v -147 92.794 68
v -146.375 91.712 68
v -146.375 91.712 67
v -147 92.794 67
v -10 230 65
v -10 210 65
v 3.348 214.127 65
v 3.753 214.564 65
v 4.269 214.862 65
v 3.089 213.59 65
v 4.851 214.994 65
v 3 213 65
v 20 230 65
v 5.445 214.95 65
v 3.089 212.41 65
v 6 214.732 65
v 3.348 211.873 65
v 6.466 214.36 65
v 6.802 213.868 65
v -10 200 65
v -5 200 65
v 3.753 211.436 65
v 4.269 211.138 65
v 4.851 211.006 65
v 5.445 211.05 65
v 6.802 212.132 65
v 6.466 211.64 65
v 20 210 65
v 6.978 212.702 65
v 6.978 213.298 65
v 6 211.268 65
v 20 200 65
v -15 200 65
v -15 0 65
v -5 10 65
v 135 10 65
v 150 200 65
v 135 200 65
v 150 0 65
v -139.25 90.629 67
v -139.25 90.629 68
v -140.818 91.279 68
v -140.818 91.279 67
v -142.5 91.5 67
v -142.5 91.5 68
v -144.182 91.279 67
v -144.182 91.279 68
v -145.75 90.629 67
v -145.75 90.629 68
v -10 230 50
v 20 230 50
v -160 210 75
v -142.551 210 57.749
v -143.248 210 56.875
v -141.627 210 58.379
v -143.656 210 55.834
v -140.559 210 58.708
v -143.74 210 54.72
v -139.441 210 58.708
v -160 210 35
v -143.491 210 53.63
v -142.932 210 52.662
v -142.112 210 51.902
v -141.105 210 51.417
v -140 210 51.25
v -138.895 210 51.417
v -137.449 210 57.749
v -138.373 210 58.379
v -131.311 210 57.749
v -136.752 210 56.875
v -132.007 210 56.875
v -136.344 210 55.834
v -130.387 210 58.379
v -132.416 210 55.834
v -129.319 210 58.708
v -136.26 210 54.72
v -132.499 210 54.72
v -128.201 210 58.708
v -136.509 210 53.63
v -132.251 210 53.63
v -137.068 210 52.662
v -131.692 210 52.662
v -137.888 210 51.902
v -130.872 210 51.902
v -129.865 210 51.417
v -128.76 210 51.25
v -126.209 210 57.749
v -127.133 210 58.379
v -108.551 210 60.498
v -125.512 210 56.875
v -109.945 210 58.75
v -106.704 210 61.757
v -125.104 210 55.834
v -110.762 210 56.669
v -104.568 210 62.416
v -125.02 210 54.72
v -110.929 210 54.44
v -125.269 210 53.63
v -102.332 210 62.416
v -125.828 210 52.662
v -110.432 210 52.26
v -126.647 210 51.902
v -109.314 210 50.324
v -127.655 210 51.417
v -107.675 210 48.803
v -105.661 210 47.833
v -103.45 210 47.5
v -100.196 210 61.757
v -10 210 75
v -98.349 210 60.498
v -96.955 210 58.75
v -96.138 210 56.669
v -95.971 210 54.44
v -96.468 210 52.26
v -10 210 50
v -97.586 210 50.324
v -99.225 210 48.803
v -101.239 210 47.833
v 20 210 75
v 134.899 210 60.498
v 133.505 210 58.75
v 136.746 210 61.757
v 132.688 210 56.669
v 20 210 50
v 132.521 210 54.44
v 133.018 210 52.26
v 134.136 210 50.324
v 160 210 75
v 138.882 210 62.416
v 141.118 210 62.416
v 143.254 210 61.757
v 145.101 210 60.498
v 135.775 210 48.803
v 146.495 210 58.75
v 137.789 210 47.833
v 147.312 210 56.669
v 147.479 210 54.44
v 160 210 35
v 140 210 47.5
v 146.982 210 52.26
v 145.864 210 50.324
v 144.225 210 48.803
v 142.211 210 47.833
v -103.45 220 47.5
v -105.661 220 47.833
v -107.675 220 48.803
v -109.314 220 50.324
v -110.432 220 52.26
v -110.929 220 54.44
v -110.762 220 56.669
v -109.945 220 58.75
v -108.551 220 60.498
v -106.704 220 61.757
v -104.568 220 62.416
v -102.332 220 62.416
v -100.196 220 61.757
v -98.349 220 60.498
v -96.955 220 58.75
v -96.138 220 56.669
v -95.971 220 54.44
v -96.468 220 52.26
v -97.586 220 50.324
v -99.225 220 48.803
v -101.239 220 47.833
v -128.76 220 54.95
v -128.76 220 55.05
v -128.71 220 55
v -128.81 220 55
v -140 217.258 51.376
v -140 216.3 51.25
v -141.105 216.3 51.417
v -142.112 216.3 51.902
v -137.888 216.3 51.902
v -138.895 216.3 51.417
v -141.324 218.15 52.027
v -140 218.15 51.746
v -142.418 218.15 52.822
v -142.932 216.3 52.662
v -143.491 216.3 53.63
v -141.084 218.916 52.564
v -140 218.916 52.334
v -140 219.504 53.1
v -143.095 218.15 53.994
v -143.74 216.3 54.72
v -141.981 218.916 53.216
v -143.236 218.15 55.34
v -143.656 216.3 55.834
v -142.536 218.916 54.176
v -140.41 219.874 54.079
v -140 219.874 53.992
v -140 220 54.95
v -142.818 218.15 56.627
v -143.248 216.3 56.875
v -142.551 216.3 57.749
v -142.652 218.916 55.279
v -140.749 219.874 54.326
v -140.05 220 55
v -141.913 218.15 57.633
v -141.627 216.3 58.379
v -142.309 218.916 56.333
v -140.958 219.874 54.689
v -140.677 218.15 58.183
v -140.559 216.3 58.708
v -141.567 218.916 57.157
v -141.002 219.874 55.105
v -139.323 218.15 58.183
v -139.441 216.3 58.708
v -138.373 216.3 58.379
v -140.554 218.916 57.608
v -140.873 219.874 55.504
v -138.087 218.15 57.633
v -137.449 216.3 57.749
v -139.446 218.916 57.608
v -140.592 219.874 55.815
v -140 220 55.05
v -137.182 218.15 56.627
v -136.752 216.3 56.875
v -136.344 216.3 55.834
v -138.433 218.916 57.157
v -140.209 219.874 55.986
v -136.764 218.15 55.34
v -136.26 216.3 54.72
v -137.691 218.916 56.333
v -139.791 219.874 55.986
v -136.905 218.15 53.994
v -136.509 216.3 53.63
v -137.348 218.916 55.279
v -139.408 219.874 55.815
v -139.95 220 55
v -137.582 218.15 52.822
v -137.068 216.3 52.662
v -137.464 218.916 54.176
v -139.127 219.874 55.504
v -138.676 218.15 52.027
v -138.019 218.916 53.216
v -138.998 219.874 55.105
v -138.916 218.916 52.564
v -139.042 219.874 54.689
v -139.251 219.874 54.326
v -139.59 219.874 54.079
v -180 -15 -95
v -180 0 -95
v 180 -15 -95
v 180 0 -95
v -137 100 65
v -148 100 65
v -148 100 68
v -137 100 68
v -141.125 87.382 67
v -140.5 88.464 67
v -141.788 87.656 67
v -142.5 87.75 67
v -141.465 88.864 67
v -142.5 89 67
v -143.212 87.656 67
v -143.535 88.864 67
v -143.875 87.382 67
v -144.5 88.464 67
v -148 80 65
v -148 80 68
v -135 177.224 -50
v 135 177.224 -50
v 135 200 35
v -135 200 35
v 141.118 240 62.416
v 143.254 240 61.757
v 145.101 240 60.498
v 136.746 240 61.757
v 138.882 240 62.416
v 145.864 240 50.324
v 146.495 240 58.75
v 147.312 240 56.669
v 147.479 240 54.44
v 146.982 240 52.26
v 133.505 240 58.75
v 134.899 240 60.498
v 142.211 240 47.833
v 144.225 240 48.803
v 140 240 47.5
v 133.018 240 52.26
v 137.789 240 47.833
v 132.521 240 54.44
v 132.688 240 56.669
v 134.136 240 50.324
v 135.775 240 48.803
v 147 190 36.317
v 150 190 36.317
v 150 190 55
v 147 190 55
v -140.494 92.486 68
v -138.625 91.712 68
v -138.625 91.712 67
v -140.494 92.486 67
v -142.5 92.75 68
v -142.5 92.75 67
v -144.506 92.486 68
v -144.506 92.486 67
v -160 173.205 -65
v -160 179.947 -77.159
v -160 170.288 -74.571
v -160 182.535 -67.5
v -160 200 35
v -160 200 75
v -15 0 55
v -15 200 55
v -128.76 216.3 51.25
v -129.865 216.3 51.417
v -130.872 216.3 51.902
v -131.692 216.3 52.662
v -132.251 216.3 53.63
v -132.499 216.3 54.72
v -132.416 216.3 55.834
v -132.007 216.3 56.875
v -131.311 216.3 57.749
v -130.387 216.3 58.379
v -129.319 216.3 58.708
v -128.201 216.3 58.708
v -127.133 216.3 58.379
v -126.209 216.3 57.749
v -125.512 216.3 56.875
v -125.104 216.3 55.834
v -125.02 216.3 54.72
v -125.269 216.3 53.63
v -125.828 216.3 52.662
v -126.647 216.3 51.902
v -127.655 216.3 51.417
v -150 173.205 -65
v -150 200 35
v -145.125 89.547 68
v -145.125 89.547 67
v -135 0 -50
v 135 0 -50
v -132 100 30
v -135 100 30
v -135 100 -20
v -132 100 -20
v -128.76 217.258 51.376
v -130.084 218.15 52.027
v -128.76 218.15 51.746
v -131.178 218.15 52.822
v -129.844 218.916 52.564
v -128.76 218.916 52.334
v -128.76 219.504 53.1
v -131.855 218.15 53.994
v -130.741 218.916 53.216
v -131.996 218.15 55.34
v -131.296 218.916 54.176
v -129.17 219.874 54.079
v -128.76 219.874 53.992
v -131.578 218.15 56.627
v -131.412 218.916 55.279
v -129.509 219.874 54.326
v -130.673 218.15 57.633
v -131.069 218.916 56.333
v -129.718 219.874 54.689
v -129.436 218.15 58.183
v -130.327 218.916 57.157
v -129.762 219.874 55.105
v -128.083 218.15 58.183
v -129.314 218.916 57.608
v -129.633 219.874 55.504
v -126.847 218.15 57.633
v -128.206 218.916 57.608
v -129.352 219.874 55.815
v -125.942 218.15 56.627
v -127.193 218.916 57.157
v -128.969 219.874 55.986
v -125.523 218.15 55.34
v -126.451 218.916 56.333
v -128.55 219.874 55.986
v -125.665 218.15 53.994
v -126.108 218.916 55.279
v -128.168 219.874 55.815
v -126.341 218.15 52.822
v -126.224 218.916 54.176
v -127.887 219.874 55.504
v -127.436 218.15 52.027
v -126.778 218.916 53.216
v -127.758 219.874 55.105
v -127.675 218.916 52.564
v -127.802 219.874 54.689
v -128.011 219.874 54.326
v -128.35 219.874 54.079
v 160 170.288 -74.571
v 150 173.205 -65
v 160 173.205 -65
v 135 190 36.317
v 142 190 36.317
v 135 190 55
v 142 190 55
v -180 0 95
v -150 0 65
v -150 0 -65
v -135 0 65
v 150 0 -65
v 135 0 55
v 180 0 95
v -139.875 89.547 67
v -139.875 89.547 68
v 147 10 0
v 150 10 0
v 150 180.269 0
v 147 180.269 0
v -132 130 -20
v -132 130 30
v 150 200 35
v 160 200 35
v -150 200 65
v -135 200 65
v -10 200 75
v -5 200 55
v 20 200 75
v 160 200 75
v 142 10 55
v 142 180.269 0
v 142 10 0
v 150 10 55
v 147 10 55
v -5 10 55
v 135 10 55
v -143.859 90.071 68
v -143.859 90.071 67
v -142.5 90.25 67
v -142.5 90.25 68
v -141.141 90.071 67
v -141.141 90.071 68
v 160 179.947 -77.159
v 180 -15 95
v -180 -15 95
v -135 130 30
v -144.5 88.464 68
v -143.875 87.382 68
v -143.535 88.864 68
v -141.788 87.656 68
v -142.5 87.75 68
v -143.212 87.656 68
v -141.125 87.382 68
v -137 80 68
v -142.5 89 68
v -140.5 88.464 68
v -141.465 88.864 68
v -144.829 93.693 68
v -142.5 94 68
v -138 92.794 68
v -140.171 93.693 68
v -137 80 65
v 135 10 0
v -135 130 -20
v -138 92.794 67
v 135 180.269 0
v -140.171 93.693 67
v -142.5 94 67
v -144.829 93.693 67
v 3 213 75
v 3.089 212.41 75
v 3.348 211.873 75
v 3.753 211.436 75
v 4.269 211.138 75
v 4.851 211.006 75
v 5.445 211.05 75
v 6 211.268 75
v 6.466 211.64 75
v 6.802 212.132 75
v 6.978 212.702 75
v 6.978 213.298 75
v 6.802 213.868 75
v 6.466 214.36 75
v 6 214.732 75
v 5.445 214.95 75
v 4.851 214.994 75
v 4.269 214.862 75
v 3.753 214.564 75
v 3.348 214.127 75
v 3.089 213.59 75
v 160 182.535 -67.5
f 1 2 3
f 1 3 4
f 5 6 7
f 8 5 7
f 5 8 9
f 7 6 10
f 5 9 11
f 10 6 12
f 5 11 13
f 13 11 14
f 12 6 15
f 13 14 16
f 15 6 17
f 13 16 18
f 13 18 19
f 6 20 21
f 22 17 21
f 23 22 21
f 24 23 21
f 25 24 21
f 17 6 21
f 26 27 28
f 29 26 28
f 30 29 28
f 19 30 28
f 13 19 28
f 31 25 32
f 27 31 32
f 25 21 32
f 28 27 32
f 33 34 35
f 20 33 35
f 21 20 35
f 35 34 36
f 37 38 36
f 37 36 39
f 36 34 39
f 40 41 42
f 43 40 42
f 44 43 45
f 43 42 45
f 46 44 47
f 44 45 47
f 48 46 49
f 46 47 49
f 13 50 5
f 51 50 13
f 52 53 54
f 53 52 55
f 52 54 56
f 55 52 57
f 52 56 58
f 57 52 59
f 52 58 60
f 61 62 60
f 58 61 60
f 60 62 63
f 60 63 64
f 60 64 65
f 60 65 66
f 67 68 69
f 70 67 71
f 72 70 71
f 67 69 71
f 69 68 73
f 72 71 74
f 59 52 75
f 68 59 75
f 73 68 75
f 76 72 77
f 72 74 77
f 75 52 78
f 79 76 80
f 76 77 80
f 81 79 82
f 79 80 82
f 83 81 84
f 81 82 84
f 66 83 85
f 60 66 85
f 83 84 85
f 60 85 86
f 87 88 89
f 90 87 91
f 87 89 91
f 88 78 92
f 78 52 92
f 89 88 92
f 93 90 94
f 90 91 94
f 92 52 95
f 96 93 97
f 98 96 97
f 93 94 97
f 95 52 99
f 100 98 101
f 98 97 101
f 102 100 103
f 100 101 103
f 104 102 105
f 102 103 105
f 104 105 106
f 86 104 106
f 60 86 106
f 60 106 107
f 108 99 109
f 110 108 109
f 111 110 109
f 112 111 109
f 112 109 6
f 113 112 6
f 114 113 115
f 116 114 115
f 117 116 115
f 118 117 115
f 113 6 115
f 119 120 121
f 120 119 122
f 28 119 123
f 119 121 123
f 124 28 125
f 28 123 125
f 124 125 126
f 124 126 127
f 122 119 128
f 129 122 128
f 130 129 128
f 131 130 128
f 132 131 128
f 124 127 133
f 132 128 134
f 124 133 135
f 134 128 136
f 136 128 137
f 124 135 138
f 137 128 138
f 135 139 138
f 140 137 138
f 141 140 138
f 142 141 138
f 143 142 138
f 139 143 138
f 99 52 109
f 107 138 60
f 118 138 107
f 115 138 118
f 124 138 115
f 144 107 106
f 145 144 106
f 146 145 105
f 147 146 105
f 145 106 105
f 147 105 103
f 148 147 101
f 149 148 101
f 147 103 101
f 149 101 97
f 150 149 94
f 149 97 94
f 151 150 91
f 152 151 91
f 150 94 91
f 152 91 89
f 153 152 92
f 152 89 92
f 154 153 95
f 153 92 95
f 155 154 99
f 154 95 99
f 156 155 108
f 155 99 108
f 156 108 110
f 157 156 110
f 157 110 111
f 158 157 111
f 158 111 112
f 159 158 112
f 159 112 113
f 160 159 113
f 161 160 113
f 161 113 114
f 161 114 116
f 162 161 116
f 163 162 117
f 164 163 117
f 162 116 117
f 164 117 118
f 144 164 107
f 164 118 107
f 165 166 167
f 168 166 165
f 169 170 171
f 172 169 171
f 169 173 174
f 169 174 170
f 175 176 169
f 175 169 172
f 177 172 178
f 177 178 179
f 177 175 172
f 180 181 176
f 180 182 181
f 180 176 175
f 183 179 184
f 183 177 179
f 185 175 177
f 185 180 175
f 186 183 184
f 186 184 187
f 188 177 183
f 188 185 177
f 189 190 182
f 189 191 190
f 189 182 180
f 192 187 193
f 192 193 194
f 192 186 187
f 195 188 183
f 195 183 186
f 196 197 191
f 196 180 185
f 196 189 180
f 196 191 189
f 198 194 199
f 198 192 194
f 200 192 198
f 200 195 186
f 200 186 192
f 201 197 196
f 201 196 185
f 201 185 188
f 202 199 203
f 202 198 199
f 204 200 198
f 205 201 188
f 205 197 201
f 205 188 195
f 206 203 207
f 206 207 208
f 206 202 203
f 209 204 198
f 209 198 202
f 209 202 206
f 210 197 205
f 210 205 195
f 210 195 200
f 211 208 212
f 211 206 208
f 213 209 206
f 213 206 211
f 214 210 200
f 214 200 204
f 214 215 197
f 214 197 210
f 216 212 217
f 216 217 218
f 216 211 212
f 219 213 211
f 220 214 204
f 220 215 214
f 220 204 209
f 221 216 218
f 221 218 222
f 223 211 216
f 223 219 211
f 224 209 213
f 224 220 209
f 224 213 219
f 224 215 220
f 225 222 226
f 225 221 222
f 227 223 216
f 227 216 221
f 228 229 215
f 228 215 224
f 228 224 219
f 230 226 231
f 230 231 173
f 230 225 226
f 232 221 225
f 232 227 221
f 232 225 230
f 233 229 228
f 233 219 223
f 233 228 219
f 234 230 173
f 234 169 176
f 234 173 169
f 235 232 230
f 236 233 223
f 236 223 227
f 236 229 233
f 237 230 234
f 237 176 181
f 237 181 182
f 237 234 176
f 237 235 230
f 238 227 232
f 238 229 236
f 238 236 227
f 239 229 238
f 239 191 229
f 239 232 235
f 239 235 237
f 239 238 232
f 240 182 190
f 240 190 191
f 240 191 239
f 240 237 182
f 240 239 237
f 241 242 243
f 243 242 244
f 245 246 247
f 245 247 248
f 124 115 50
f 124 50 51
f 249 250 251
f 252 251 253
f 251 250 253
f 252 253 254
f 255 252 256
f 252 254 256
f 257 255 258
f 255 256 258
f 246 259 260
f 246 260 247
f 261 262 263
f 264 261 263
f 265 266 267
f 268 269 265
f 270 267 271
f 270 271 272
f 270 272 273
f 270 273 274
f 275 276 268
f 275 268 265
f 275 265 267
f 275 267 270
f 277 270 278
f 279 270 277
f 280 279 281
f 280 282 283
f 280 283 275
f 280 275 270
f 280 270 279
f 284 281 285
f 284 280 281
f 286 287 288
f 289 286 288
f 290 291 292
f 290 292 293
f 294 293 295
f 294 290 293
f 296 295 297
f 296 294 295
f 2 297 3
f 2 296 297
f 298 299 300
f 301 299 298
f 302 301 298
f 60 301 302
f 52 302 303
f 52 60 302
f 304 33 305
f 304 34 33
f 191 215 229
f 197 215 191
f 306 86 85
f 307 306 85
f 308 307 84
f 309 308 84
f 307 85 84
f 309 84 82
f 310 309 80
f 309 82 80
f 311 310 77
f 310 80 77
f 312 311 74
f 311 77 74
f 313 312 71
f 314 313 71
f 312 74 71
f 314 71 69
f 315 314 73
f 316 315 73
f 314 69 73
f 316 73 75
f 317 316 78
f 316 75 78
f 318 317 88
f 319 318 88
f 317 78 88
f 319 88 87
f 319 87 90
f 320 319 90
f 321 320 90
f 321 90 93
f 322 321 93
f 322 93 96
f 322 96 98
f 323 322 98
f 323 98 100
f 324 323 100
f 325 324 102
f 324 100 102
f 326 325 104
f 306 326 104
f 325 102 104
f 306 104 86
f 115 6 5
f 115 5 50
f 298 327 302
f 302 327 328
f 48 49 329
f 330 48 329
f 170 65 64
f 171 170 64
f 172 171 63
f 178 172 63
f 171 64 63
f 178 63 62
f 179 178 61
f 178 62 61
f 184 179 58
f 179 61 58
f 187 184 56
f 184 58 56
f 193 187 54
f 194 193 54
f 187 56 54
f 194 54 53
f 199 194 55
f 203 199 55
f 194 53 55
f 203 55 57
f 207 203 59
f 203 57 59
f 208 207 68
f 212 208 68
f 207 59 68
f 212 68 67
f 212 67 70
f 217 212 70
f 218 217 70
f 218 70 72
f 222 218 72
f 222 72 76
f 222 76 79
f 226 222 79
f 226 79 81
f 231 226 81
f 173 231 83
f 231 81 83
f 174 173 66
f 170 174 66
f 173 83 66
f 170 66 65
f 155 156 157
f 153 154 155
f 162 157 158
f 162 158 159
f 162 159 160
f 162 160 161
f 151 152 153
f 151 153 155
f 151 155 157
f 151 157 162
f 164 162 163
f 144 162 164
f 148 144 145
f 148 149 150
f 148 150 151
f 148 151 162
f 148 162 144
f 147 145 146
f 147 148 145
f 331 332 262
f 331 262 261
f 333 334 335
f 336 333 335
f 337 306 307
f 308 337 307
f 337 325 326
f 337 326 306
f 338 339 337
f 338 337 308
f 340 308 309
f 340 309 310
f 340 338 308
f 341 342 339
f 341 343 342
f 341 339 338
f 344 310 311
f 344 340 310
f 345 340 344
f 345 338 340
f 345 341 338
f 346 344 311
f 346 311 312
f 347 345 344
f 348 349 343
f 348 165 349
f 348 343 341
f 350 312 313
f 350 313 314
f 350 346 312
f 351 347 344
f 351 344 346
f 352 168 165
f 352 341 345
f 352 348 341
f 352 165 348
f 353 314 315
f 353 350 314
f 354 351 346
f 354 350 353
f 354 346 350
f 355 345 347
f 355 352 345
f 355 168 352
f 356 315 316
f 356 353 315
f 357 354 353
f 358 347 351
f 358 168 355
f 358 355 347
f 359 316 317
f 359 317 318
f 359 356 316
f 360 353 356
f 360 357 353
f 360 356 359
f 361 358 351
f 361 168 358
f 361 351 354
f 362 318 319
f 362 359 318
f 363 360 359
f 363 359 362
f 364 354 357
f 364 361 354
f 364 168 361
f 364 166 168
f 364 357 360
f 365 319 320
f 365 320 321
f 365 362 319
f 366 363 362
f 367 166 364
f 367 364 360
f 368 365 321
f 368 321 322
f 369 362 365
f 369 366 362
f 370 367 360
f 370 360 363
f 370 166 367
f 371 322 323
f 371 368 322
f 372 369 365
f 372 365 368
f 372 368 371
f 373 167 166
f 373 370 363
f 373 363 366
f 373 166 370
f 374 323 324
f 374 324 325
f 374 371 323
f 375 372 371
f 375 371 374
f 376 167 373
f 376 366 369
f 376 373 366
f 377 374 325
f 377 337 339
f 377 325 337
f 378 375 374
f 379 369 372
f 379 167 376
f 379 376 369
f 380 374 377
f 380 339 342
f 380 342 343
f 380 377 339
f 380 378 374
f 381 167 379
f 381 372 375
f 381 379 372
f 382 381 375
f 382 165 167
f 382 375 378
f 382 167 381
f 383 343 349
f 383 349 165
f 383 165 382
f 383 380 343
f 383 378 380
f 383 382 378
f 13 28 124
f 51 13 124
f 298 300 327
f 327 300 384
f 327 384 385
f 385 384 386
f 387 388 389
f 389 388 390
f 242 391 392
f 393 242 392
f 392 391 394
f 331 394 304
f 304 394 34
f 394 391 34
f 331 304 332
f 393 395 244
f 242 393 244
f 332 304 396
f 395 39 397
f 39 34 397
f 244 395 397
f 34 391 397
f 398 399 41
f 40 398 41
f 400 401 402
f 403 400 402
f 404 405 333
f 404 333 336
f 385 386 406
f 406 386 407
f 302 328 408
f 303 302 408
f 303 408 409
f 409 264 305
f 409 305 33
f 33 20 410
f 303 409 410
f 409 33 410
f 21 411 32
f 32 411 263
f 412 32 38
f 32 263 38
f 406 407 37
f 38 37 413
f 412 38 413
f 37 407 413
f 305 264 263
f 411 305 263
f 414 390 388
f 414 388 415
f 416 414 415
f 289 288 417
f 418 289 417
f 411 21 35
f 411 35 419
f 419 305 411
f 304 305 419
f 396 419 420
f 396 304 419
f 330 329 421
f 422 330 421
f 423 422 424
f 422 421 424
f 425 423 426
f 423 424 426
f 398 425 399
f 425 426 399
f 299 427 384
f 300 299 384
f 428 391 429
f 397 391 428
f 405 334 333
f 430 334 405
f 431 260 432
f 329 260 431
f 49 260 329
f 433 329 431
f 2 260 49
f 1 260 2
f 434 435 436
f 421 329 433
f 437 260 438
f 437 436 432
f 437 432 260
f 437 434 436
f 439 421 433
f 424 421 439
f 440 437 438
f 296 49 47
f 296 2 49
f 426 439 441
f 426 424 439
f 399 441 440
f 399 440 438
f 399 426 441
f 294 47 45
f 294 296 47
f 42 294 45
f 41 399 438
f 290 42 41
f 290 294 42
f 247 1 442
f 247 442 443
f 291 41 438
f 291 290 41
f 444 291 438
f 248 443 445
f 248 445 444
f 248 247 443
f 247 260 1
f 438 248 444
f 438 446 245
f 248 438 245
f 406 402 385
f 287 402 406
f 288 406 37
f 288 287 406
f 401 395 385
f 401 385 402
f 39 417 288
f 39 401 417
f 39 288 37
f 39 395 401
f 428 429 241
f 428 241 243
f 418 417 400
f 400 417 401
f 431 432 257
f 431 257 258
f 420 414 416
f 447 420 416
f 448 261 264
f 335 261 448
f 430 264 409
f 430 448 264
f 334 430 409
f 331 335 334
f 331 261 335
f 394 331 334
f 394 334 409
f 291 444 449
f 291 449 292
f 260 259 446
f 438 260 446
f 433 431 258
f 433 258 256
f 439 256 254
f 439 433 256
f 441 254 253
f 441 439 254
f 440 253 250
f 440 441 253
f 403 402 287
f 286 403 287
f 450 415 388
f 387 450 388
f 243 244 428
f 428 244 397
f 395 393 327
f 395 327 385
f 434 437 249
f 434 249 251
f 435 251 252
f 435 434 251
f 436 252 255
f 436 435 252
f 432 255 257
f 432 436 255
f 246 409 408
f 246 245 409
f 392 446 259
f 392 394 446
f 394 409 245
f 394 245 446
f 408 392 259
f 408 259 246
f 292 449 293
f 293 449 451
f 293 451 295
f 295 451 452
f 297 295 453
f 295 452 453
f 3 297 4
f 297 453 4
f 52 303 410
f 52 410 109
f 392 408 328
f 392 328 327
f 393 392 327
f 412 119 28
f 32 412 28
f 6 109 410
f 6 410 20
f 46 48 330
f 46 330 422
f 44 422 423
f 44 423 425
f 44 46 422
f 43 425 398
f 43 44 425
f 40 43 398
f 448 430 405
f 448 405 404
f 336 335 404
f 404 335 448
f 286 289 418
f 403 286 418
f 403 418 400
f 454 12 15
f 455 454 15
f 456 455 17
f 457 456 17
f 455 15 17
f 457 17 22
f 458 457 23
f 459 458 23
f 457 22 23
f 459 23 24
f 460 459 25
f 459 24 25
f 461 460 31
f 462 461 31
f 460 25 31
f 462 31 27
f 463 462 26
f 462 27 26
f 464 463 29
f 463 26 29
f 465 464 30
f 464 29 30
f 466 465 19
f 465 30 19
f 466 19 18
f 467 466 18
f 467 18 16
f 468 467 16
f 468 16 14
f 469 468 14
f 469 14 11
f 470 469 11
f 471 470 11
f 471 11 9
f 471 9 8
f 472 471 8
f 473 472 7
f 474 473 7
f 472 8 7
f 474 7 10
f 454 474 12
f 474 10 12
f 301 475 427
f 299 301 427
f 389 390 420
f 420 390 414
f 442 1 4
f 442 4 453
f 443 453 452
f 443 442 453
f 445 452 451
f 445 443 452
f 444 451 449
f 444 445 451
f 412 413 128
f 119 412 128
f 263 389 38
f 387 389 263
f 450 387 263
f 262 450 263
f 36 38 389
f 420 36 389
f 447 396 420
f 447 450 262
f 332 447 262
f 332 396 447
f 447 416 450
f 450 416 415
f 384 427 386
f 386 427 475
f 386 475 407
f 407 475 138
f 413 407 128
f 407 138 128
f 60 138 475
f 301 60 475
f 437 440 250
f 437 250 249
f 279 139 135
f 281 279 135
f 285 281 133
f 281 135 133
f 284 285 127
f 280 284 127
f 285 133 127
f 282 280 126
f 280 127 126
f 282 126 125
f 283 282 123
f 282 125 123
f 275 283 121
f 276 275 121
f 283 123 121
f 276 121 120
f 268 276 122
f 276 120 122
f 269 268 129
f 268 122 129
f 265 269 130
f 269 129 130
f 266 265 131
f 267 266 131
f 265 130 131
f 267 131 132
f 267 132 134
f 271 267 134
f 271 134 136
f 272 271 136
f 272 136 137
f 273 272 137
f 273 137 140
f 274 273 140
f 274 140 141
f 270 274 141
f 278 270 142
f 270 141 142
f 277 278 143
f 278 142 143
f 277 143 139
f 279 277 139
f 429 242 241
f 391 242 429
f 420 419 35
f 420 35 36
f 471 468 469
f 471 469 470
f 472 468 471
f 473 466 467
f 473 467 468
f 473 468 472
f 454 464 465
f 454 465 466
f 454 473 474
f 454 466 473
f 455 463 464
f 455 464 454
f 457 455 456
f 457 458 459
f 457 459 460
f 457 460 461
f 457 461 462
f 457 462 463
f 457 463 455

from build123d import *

# Parameters (mm, degrees)
SALIENTE_EXTRUIR11_DEPTH      = 200
CORTAR_EXTRUIR10_DEPTH        = 300
SALIENTE_EXTRUIR12_DEPTH      = 10
SALIENTE_EXTRUIR12_DEPTH_BACK = 310
CROQUIS30_W                   = 360
CROQUIS30_H                   = 190
SALIENTE_EXTRUIR13_DEPTH      = 15
CORTAR_EXTRUIR11_DEPTH        = 15
CROQUIS32_W                   = 5
CROQUIS32_H                   = 55
SALIENTE_EXTRUIR14_DEPTH      = 180
CROQUIS35_W                   = 11
CROQUIS35_H                   = 20
SALIENTE_EXTRUIR15_DEPTH      = 3
CORTAR_EXTRUIR12_DEPTH        = 1
CROQUIS40_W                   = 150
CROQUIS40_H                   = 10
SALIENTE_EXTRUIR16_DEPTH      = 10
CROQUIS41_W                   = 10
CROQUIS41_H                   = 10
SALIENTE_EXTRUIR17_DEPTH      = 190
CROQUIS42_W                   = 50
CROQUIS42_H                   = 30
SALIENTE_EXTRUIR18_DEPTH      = 3
CROQUIS43_W                   = 30
CROQUIS43_H                   = 10
CORTAR_EXTRUIR13_DEPTH        = 10
CROQUIS44_R                   = 7.5
SALIENTE_EXTRUIR19_DEPTH      = 30
CROQUIS45_W                   = 30
CROQUIS45_H                   = 15
SALIENTE_EXTRUIR20_DEPTH      = 20
CROQUIS47_R                   = 2
SALIENTE_EXTRUIR21_DEPTH      = 10
CORTAR_EXTRUIR14_START        = -10
CROQUIS49_R                   = 2
CORTAR_EXTRUIR14_DEPTH        = 10
CROQUIS50_R                   = 2
SALIENTE_EXTRUIR22_DEPTH      = 10
CROQUIS52_R                   = 3.75
SALIENTE_EXTRUIR29_DEPTH      = 10
REDONDEO6_R                   = 3.7
CROQUIS53_R                   = 7.5
SALIENTE_EXTRUIR30_DEPTH      = 10


with BuildPart() as part:
    # Croquis4 → Saliente-Extruir11 (new body)
    with BuildSketch(Plane(origin=(0, 0, 0), x_dir=(1, 0, 0), z_dir=(0, 1, 0))):
        Polygon((-150, 65), (150, 65), (150, -65), (135, -65), (135, 50), (-135, 50), (-135, -65), (-150, -65), align=None)
    extrude(amount=SALIENTE_EXTRUIR11_DEPTH)

    # Croquis28 → Cortar-Extruir10 (cut)
    with BuildSketch(Plane.ZY.offset(150)):
        Polygon((-65, 173.205080757), (35, 200), (-65, 200), align=None)
    extrude(amount=-CORTAR_EXTRUIR10_DEPTH, mode=Mode.SUBTRACT)

    # Croquis29 → Saliente-Extruir12 (add, two sides: drawn at the far end of the back side and taken through both)
    with BuildSketch(Plane.ZY.offset(150).offset(-SALIENTE_EXTRUIR12_DEPTH_BACK)):
        Polygon((-65, 173.205080757), (35, 200), (65, 200), (75, 200), (75, 210), (35, 210), (-67.5, 182.535207776), (-77.159258263, 179.947017325), (-74.571067812, 170.287759062), align=None)
    extrude(amount=SALIENTE_EXTRUIR12_DEPTH + SALIENTE_EXTRUIR12_DEPTH_BACK)

    # Croquis30 → Saliente-Extruir13 (add)
    with BuildSketch(Plane.XZ):
        Rectangle(CROQUIS30_W, CROQUIS30_H)
    extrude(amount=SALIENTE_EXTRUIR13_DEPTH)

    # Croquis31 → Cortar-Extruir11 (cut)
    with BuildSketch(Plane(origin=(150, 0, 0), x_dir=(0, 0, -1), z_dir=(1, 0, 0))):
        Polygon((-55, 190), (-55, 10), (0, 10), (0, 180.269016461), (-36.316524976, 190), align=None)
    extrude(amount=-CORTAR_EXTRUIR11_DEPTH, mode=Mode.SUBTRACT)

    # Croquis32 → Saliente-Extruir14 (add)
    with BuildSketch(Plane(origin=(0, 10, 0), x_dir=(1, 0, 0), z_dir=(0, 1, 0))):
        with Locations((144.5, -27.5)):
            Rectangle(CROQUIS32_W, CROQUIS32_H)
    extrude(amount=SALIENTE_EXTRUIR14_DEPTH)

    # Croquis35 → Saliente-Extruir15 (add)
    with BuildSketch(Plane.XY.offset(65)):
        with Locations((-142.5, 90)):
            Rectangle(CROQUIS35_W, CROQUIS35_H)
    extrude(amount=SALIENTE_EXTRUIR15_DEPTH)

    # Croquis36 → Cortar-Extruir12 (cut)
    with BuildSketch(Plane.XY.offset(68)):
        with BuildLine():
            Line((-143.875, 87.38156986), (-144.5, 88.464101615))
            ThreePointArc((-144.5, 88.464101615), (-142.5, 89), (-140.5, 88.464101615))
            Line((-140.5, 88.464101615), (-141.125, 87.38156986))
            ThreePointArc((-141.125, 87.38156986), (-142.5, 87.75), (-143.875, 87.38156986))
        make_face()
        with BuildLine():
            Line((-139.875, 89.54663337), (-139.25, 90.629165125))
            ThreePointArc((-139.25, 90.629165125), (-142.5, 91.5), (-145.75, 90.629165125))
            Line((-145.75, 90.629165125), (-145.125, 89.54663337))
            ThreePointArc((-145.125, 89.54663337), (-142.5, 90.25), (-139.875, 89.54663337))
        make_face()
        with BuildLine():
            Line((-146.375, 91.711696879), (-147, 92.794228634))
            ThreePointArc((-147, 92.794228634), (-142.5, 94), (-138, 92.794228634))
            Line((-138, 92.794228634), (-138.625, 91.711696879))
            ThreePointArc((-138.625, 91.711696879), (-142.5, 92.75), (-146.375, 91.711696879))
        make_face()
    extrude(amount=-CORTAR_EXTRUIR12_DEPTH, mode=Mode.SUBTRACT)

    # Croquis40 → Saliente-Extruir16 (add)
    with BuildSketch(Plane(origin=(0, 0, 0), x_dir=(1, 0, 0), z_dir=(0, 1, 0))):
        with Locations((60, -60)):
            Rectangle(CROQUIS40_W, CROQUIS40_H)
    extrude(amount=SALIENTE_EXTRUIR16_DEPTH)

    # Croquis41 → Saliente-Extruir17 (add)
    with BuildSketch(Plane(origin=(0, 10, 0), x_dir=(1, 0, 0), z_dir=(0, 1, 0))):
        with Locations((-10, -60)):
            Rectangle(CROQUIS41_W, CROQUIS41_H)
    extrude(amount=SALIENTE_EXTRUIR17_DEPTH)

    # Croquis42 → Saliente-Extruir18 (add)
    with BuildSketch(Plane(origin=(-135, 0, 0), x_dir=(0, 0, -1), z_dir=(1, 0, 0))):
        with Locations((-5, 115)):
            Rectangle(CROQUIS42_W, CROQUIS42_H)
    extrude(amount=SALIENTE_EXTRUIR18_DEPTH)

    # Croquis43 → Cortar-Extruir13 (cut)
    with BuildSketch(Plane(origin=(0, 210, 0), x_dir=(1, 0, 0), z_dir=(0, 1, 0))):
        with Locations((5, -70)):
            Rectangle(CROQUIS43_W, CROQUIS43_H)
    extrude(amount=-CORTAR_EXTRUIR13_DEPTH, mode=Mode.SUBTRACT)

    # Croquis44 → Saliente-Extruir19 (add)
    with BuildSketch(Plane(origin=(0, 210, 0), x_dir=(1, 0, 0), z_dir=(0, 1, 0))):
        with Locations(Location((140, -55, 0), (0, 0, 90))):
            Circle(CROQUIS44_R)
    extrude(amount=SALIENTE_EXTRUIR19_DEPTH)

    # Croquis45 → Saliente-Extruir20 (add)
    with BuildSketch(Plane(origin=(0, 210, 0), x_dir=(1, 0, 0), z_dir=(0, 1, 0))):
        with Locations((5, -57.5)):
            Rectangle(CROQUIS45_W, CROQUIS45_H)
    extrude(amount=SALIENTE_EXTRUIR20_DEPTH)

    # Croquis47 → Saliente-Extruir21 (add)
    with BuildSketch(Plane.XY.offset(65)):
        with Locations(Location((5, 215, 0), (0, 0, 180))):
            Circle(CROQUIS47_R)
    extrude(amount=SALIENTE_EXTRUIR21_DEPTH)

    # Croquis49 → Cortar-Extruir14 (cut)
    with BuildSketch(Plane.XY.offset(75).offset(CORTAR_EXTRUIR14_START)):
        with Locations((5, 215)):
            Circle(CROQUIS49_R)
    extrude(amount=CORTAR_EXTRUIR14_DEPTH, mode=Mode.SUBTRACT)

    # Croquis50 → Saliente-Extruir22 (add)
    with BuildSketch(Plane.XY.offset(65)):
        with Locations(Location((5, 213, 0), (0, 0, 180))):
            Circle(CROQUIS50_R)
    extrude(amount=SALIENTE_EXTRUIR22_DEPTH)

    # Croquis52 → Saliente-Extruir29 (add)
    with BuildSketch(Plane(origin=(0, 210, 0), x_dir=(1, 0, 0), z_dir=(0, 1, 0))):
        with Locations(Location((-140, -55, 0), (0, 0, 90))):
            Circle(CROQUIS52_R)
        with Locations(Location((-128.75988107, -55, 0), (0, 0, 90))):
            Circle(CROQUIS52_R)
    extrude(amount=SALIENTE_EXTRUIR29_DEPTH)

    # Redondeo6
    redondeo6_edges = [part.edges().sort_by_distance(p)[0] for p in [
        (-140, 220, 58.75),
        (-128.75988107, 220, 58.75),
    ]]
    fillet(redondeo6_edges, radius=REDONDEO6_R)

    # Croquis53 → Saliente-Extruir30 (add)
    with BuildSketch(Plane(origin=(0, 210, 0), x_dir=(1, 0, 0), z_dir=(0, 1, 0))):
        with Locations(Location((-103.450024464, -55, 0), (0, 0, 90))):
            Circle(CROQUIS53_R)
    extrude(amount=SALIENTE_EXTRUIR30_DEPTH)


solid = part.part
